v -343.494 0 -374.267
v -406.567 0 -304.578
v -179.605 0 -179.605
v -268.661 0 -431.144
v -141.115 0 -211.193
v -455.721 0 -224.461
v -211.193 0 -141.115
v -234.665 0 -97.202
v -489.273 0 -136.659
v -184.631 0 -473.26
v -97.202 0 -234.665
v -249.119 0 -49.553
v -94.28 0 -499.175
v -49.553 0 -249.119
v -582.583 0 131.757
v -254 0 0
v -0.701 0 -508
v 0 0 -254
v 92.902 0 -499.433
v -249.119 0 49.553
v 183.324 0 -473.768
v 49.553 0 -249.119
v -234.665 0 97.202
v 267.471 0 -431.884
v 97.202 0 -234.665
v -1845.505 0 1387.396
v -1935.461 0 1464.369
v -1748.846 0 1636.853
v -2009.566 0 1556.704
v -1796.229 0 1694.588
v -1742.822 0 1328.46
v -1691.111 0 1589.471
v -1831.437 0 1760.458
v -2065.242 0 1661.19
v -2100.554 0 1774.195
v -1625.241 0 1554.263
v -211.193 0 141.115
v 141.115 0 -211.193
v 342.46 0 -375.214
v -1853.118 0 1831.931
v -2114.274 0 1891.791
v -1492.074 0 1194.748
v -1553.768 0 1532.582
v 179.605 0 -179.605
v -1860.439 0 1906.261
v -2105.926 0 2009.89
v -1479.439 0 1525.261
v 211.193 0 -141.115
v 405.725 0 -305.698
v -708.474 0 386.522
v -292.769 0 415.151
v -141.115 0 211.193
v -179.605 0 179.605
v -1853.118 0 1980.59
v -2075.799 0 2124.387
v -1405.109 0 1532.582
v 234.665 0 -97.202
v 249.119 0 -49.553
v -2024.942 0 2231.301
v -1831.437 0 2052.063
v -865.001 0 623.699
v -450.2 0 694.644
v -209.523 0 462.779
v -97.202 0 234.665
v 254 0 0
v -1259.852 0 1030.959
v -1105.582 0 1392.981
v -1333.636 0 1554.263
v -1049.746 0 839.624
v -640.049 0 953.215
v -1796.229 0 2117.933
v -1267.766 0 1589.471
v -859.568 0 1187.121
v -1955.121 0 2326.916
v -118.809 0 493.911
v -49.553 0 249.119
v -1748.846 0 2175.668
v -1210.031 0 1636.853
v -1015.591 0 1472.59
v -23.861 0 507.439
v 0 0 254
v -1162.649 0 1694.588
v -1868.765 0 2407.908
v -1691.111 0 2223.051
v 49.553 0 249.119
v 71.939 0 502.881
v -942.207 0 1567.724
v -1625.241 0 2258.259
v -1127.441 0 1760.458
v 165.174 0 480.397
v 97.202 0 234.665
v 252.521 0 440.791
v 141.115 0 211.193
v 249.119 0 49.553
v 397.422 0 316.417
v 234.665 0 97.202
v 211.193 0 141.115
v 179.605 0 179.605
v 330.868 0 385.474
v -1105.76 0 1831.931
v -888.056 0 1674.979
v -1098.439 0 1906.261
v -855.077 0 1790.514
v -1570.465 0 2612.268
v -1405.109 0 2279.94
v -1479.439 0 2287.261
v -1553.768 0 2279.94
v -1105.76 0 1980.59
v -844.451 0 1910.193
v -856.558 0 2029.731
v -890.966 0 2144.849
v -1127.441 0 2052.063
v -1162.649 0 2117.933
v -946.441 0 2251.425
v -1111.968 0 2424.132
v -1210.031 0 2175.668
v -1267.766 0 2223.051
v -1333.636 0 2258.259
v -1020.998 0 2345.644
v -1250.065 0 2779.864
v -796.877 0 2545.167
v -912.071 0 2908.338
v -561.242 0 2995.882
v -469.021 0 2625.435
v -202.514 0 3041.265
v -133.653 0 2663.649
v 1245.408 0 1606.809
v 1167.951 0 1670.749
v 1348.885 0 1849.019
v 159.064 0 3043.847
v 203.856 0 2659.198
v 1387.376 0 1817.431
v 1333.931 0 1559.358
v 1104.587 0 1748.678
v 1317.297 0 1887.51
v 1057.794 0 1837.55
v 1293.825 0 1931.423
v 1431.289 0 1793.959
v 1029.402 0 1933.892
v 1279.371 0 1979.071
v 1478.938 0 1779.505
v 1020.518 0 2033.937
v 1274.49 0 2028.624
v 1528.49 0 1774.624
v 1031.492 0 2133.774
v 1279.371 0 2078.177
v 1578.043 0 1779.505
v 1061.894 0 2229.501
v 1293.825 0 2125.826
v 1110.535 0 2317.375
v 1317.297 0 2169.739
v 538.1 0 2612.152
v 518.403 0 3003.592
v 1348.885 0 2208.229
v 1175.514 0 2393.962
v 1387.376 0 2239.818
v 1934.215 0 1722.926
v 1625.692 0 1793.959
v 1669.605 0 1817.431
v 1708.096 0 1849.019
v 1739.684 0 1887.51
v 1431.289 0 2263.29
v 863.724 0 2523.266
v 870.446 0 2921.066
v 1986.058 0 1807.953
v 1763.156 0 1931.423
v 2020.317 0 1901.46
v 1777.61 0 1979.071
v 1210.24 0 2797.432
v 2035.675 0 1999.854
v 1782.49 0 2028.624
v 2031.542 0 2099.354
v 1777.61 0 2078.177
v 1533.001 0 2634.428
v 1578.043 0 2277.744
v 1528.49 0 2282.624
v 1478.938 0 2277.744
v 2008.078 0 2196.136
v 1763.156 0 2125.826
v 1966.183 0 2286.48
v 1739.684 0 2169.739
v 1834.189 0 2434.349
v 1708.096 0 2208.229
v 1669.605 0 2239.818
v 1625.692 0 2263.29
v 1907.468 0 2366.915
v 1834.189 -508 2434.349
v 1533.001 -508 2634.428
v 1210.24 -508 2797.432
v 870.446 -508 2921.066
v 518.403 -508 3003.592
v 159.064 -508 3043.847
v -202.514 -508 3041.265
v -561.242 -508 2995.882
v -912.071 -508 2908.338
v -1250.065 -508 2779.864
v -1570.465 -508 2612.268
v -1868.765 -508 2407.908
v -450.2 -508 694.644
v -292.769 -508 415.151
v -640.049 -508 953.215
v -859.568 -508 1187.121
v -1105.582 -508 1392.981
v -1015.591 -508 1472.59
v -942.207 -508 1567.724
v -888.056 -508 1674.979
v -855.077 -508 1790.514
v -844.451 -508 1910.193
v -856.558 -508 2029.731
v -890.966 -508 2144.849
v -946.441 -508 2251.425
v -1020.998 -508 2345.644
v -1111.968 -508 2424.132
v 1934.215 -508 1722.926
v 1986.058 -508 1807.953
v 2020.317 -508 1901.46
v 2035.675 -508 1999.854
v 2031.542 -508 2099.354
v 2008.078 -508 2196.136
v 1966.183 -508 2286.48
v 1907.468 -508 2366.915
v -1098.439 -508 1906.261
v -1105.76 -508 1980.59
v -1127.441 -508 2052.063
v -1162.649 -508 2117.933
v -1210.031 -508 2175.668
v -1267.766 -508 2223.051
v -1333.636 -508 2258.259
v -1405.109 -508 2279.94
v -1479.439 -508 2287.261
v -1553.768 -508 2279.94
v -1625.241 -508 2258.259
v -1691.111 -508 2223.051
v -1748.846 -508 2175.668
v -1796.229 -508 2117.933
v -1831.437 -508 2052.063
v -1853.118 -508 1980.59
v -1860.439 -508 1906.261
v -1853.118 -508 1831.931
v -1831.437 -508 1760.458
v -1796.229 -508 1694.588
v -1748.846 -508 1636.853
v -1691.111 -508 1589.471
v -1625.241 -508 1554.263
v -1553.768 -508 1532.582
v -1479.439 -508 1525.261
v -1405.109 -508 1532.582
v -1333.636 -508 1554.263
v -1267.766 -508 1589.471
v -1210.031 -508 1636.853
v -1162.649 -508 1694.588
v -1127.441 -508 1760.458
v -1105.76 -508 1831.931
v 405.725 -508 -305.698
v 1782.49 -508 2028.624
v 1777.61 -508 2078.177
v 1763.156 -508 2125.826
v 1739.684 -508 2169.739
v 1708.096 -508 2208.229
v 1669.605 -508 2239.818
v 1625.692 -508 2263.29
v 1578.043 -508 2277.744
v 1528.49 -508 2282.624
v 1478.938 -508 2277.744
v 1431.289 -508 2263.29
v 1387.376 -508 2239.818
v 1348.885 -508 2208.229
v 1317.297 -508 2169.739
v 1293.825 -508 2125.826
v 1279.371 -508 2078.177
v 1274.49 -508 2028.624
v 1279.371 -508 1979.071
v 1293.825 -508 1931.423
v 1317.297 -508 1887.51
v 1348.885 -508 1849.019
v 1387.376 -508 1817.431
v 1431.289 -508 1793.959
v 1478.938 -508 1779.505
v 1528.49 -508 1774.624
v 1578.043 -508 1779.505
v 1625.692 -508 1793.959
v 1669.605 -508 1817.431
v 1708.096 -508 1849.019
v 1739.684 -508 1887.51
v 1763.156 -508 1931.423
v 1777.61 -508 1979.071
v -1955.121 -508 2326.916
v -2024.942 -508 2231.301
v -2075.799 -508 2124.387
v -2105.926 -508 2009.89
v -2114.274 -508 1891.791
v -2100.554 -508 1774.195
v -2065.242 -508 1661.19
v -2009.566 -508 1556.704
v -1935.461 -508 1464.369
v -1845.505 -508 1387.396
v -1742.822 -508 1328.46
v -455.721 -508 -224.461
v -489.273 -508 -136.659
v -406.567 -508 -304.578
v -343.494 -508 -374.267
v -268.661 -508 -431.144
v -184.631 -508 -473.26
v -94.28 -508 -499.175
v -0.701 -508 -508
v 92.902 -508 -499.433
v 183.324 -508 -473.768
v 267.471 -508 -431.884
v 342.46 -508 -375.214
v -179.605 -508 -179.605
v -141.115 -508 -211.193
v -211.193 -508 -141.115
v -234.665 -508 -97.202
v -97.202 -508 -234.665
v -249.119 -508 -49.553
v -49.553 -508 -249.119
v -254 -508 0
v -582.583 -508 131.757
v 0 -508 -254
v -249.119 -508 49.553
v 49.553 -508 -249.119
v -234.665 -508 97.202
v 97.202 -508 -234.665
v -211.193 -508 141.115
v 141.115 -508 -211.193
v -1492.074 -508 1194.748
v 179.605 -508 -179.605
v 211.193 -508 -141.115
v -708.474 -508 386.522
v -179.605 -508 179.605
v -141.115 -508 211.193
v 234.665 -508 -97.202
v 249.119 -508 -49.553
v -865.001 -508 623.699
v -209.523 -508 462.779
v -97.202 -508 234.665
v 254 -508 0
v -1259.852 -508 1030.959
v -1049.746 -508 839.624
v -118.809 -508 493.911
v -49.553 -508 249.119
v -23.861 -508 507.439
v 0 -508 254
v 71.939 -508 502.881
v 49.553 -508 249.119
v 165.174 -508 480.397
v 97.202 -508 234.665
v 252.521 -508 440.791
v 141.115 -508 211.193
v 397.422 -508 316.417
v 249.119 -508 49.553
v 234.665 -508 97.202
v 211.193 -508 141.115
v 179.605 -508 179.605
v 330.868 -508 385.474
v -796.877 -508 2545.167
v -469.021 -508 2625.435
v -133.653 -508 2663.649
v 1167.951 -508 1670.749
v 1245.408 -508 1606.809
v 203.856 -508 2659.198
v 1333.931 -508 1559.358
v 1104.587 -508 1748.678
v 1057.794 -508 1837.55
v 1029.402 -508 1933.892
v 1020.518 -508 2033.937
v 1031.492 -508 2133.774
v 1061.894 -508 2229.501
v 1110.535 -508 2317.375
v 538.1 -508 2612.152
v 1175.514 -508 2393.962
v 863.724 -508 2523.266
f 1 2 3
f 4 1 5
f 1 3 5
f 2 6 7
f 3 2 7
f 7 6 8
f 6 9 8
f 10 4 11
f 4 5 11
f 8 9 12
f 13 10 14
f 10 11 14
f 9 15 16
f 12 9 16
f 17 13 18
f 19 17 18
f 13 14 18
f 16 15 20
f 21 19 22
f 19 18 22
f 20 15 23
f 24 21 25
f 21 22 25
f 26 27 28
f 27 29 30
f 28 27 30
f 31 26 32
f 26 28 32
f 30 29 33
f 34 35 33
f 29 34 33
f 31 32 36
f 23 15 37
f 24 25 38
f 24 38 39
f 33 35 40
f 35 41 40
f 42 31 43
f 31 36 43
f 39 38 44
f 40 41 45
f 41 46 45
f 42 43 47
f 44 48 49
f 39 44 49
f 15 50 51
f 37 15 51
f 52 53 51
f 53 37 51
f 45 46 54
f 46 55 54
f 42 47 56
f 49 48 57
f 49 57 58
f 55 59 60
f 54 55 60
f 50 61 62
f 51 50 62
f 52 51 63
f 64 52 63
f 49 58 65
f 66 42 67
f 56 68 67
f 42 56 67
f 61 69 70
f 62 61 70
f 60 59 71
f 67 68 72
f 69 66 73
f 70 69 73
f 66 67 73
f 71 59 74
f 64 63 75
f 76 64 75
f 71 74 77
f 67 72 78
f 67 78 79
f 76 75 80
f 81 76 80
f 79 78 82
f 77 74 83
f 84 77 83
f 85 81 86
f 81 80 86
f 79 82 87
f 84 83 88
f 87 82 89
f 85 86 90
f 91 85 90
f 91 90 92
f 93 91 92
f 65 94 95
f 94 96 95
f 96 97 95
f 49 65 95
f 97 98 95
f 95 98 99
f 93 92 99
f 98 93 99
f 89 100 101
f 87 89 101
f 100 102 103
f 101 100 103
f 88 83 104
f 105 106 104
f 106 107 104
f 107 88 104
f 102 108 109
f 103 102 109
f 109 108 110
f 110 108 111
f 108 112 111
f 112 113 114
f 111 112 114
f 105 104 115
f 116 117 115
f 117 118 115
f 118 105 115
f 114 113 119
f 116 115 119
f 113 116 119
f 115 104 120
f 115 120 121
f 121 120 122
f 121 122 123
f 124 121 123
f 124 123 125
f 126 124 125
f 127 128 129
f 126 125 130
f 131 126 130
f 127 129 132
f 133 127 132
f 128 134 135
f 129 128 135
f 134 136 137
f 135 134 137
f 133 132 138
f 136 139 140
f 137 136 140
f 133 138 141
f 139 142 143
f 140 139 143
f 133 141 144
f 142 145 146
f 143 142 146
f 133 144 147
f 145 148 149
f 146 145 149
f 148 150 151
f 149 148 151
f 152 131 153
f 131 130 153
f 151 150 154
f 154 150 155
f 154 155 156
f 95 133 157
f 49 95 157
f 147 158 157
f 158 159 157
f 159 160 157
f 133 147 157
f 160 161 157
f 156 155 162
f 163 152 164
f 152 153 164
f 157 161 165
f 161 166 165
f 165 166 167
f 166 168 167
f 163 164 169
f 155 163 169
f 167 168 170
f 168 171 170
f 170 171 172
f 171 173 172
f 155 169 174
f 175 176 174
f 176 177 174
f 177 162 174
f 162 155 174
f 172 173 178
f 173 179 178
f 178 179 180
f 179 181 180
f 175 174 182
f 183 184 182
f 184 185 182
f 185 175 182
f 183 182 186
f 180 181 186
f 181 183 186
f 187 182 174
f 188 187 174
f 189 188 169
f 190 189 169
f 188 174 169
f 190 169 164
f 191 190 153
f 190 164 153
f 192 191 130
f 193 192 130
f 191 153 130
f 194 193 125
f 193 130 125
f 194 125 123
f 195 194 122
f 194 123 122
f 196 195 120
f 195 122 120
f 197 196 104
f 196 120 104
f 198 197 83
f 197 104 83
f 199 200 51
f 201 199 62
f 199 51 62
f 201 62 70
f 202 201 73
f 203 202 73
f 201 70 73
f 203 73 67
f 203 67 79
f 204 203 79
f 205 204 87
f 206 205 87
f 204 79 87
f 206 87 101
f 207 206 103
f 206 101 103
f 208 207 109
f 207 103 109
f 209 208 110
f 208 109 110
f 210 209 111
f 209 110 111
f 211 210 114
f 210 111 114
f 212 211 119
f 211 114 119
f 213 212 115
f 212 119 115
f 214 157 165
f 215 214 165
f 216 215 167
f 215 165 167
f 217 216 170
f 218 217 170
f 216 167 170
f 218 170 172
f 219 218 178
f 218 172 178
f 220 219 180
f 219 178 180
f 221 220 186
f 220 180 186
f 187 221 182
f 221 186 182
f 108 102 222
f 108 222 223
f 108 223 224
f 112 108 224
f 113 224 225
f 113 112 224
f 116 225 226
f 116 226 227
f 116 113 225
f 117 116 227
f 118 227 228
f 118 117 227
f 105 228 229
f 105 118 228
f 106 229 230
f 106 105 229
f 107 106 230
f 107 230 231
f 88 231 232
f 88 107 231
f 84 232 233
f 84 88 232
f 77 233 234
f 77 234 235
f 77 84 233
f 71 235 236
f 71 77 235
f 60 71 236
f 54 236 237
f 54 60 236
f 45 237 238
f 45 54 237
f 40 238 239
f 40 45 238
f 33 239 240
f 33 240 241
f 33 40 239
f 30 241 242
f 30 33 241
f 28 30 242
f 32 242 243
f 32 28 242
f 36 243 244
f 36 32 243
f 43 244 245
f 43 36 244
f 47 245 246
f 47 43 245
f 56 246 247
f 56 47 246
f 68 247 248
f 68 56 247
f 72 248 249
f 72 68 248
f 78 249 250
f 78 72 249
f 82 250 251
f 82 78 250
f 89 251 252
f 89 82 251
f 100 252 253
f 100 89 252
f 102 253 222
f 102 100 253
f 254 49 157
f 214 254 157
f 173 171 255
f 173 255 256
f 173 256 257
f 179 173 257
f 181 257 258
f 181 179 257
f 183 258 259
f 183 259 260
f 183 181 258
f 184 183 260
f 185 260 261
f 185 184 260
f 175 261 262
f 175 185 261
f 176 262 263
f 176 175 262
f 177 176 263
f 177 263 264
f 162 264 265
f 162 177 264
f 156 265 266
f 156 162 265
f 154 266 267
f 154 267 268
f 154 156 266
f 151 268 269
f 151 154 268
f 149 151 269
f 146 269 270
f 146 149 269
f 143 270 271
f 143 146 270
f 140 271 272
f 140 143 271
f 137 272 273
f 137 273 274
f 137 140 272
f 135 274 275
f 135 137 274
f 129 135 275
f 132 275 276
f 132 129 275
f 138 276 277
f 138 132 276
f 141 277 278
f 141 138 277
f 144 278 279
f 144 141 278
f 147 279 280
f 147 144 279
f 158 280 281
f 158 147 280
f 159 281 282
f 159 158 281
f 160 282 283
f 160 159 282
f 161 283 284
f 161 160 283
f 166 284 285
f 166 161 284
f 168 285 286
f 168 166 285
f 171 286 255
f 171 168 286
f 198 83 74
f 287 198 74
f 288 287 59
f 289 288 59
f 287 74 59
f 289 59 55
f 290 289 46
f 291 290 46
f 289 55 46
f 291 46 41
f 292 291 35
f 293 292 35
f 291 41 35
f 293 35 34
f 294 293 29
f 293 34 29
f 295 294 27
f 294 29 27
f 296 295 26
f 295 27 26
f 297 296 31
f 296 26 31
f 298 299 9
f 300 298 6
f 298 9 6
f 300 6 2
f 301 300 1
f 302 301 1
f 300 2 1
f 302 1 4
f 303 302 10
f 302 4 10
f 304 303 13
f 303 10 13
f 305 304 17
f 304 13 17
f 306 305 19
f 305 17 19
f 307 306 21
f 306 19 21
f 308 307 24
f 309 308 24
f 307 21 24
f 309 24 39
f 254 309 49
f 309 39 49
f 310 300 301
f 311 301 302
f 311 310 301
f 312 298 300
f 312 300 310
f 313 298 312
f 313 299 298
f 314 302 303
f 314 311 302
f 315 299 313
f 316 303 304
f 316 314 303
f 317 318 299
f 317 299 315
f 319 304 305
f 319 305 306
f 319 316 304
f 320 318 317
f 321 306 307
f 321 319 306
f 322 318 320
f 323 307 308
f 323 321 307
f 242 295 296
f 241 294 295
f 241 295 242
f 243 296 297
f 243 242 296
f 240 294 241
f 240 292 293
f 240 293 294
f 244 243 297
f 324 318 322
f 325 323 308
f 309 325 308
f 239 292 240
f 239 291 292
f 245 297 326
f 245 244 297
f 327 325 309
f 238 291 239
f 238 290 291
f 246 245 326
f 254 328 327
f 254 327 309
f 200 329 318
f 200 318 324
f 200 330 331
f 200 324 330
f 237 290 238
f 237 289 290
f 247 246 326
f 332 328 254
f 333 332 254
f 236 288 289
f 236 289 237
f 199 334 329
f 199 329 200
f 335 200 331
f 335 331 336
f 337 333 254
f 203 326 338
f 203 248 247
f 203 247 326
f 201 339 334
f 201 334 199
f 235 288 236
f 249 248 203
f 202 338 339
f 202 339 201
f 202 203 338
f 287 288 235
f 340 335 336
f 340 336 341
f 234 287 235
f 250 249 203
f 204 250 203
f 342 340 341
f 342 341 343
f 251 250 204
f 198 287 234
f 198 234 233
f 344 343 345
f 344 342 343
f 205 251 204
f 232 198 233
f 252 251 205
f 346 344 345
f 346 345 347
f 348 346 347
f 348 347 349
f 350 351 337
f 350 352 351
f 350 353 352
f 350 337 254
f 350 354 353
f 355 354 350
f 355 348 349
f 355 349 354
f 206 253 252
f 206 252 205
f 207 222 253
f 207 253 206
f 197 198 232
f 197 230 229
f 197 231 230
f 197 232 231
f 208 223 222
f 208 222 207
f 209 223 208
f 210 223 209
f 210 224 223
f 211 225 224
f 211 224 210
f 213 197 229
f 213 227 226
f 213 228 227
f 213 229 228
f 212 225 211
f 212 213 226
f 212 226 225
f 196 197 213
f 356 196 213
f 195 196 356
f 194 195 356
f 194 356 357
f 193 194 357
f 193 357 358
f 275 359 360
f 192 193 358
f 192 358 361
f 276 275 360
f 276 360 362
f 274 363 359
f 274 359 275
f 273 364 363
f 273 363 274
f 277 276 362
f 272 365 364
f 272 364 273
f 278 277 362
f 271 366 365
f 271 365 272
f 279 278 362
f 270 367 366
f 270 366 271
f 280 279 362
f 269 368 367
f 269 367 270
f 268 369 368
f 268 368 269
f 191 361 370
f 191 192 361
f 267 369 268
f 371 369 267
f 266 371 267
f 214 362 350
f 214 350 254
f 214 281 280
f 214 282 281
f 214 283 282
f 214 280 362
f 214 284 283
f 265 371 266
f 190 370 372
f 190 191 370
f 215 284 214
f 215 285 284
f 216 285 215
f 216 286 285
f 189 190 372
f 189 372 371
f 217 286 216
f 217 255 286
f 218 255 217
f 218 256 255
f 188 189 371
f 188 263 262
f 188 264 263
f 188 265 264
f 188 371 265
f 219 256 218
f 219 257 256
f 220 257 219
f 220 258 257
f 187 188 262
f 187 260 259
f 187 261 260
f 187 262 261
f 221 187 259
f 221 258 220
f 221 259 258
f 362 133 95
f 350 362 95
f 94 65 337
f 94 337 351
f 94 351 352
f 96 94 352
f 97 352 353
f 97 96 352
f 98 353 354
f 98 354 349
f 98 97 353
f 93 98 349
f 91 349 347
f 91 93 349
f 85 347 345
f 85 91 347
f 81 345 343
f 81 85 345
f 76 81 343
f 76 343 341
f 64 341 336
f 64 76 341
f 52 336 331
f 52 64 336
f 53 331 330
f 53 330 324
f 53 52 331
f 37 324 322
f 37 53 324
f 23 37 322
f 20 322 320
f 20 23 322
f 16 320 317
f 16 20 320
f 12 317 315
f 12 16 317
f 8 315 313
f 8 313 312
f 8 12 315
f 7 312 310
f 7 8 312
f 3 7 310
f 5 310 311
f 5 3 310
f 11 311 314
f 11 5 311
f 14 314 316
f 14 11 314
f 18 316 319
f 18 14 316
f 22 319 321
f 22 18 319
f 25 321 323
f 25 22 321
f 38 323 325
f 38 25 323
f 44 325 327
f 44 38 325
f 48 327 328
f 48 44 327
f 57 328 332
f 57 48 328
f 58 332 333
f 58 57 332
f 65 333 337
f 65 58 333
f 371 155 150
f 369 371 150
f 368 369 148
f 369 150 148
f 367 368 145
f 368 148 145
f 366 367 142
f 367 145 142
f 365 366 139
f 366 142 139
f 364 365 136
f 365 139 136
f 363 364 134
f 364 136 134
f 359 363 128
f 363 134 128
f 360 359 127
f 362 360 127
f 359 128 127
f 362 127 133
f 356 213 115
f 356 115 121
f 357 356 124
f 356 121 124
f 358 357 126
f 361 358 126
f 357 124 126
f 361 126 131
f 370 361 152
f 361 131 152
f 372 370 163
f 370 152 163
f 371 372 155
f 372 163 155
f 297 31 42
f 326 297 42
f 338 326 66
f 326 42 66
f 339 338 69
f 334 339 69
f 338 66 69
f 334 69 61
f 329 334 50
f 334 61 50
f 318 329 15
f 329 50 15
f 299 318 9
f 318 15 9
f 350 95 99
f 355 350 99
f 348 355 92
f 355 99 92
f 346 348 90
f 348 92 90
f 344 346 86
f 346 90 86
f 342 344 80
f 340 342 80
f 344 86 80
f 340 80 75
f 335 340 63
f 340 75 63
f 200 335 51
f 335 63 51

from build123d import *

# Parameters (mm, degrees)
F0_R     = 254
F0_R_2   = 381
F1_DEPTH = 508


with BuildPart() as f1:
    # F0 (on Front) → F1 (new body)
    with BuildSketch(Plane.XZ):
        with BuildLine():
            ThreePointArc((-1742.822261, 1328.459635), (-954.015045, 734.534806), (-489.273262, -136.658973))
            ThreePointArc((-489.273262, -136.658973), (-94.279582, -499.174679), (405.724875, -305.698096))
            Line((405.724875, -305.698096), (1934.215357, 1722.926276))
            ThreePointArc((1934.215357, 1722.926276), (2031.542489, 2099.353986), (1834.188579, 2434.349247))
            ThreePointArc((1834.188579, 2434.349247), (-21.763691, 3047.922299), (-1868.764722, 2407.908307))
            ThreePointArc((-1868.764722, 2407.908307), (-2110.160375, 1832.672589), (-1742.822261, 1328.459635))
        make_face()
        Circle(F0_R, mode=Mode.SUBTRACT)
        with Locations((-1479.438738, 1906.260743)):
            Circle(F0_R_2, mode=Mode.SUBTRACT)
        with BuildLine():
            Line((1333.930792, 1559.358428), (397.422128, 316.416896))
            ThreePointArc((397.422128, 316.416896), (71.938518, 502.880552), (-292.769256, 415.150771))
            ThreePointArc((-292.769256, 415.150771), (-640.048753, 953.214618), (-1105.582396, 1392.980668))
            ThreePointArc((-1105.582396, 1392.980668), (-844.450915, 1910.193246), (-1111.968354, 2424.131882))
            ThreePointArc((-1111.968354, 2424.131882), (35.172025, 2666.768068), (1175.514235, 2393.962256))
            ThreePointArc((1175.514235, 2393.962256), (1029.401524, 1933.892056), (1333.930792, 1559.358428))
        make_face(mode=Mode.SUBTRACT)
        with Locations((1528.490482, 2028.624373)):
            Circle(F0_R, mode=Mode.SUBTRACT)
    extrude(amount=F1_DEPTH)


solid = f1.part
